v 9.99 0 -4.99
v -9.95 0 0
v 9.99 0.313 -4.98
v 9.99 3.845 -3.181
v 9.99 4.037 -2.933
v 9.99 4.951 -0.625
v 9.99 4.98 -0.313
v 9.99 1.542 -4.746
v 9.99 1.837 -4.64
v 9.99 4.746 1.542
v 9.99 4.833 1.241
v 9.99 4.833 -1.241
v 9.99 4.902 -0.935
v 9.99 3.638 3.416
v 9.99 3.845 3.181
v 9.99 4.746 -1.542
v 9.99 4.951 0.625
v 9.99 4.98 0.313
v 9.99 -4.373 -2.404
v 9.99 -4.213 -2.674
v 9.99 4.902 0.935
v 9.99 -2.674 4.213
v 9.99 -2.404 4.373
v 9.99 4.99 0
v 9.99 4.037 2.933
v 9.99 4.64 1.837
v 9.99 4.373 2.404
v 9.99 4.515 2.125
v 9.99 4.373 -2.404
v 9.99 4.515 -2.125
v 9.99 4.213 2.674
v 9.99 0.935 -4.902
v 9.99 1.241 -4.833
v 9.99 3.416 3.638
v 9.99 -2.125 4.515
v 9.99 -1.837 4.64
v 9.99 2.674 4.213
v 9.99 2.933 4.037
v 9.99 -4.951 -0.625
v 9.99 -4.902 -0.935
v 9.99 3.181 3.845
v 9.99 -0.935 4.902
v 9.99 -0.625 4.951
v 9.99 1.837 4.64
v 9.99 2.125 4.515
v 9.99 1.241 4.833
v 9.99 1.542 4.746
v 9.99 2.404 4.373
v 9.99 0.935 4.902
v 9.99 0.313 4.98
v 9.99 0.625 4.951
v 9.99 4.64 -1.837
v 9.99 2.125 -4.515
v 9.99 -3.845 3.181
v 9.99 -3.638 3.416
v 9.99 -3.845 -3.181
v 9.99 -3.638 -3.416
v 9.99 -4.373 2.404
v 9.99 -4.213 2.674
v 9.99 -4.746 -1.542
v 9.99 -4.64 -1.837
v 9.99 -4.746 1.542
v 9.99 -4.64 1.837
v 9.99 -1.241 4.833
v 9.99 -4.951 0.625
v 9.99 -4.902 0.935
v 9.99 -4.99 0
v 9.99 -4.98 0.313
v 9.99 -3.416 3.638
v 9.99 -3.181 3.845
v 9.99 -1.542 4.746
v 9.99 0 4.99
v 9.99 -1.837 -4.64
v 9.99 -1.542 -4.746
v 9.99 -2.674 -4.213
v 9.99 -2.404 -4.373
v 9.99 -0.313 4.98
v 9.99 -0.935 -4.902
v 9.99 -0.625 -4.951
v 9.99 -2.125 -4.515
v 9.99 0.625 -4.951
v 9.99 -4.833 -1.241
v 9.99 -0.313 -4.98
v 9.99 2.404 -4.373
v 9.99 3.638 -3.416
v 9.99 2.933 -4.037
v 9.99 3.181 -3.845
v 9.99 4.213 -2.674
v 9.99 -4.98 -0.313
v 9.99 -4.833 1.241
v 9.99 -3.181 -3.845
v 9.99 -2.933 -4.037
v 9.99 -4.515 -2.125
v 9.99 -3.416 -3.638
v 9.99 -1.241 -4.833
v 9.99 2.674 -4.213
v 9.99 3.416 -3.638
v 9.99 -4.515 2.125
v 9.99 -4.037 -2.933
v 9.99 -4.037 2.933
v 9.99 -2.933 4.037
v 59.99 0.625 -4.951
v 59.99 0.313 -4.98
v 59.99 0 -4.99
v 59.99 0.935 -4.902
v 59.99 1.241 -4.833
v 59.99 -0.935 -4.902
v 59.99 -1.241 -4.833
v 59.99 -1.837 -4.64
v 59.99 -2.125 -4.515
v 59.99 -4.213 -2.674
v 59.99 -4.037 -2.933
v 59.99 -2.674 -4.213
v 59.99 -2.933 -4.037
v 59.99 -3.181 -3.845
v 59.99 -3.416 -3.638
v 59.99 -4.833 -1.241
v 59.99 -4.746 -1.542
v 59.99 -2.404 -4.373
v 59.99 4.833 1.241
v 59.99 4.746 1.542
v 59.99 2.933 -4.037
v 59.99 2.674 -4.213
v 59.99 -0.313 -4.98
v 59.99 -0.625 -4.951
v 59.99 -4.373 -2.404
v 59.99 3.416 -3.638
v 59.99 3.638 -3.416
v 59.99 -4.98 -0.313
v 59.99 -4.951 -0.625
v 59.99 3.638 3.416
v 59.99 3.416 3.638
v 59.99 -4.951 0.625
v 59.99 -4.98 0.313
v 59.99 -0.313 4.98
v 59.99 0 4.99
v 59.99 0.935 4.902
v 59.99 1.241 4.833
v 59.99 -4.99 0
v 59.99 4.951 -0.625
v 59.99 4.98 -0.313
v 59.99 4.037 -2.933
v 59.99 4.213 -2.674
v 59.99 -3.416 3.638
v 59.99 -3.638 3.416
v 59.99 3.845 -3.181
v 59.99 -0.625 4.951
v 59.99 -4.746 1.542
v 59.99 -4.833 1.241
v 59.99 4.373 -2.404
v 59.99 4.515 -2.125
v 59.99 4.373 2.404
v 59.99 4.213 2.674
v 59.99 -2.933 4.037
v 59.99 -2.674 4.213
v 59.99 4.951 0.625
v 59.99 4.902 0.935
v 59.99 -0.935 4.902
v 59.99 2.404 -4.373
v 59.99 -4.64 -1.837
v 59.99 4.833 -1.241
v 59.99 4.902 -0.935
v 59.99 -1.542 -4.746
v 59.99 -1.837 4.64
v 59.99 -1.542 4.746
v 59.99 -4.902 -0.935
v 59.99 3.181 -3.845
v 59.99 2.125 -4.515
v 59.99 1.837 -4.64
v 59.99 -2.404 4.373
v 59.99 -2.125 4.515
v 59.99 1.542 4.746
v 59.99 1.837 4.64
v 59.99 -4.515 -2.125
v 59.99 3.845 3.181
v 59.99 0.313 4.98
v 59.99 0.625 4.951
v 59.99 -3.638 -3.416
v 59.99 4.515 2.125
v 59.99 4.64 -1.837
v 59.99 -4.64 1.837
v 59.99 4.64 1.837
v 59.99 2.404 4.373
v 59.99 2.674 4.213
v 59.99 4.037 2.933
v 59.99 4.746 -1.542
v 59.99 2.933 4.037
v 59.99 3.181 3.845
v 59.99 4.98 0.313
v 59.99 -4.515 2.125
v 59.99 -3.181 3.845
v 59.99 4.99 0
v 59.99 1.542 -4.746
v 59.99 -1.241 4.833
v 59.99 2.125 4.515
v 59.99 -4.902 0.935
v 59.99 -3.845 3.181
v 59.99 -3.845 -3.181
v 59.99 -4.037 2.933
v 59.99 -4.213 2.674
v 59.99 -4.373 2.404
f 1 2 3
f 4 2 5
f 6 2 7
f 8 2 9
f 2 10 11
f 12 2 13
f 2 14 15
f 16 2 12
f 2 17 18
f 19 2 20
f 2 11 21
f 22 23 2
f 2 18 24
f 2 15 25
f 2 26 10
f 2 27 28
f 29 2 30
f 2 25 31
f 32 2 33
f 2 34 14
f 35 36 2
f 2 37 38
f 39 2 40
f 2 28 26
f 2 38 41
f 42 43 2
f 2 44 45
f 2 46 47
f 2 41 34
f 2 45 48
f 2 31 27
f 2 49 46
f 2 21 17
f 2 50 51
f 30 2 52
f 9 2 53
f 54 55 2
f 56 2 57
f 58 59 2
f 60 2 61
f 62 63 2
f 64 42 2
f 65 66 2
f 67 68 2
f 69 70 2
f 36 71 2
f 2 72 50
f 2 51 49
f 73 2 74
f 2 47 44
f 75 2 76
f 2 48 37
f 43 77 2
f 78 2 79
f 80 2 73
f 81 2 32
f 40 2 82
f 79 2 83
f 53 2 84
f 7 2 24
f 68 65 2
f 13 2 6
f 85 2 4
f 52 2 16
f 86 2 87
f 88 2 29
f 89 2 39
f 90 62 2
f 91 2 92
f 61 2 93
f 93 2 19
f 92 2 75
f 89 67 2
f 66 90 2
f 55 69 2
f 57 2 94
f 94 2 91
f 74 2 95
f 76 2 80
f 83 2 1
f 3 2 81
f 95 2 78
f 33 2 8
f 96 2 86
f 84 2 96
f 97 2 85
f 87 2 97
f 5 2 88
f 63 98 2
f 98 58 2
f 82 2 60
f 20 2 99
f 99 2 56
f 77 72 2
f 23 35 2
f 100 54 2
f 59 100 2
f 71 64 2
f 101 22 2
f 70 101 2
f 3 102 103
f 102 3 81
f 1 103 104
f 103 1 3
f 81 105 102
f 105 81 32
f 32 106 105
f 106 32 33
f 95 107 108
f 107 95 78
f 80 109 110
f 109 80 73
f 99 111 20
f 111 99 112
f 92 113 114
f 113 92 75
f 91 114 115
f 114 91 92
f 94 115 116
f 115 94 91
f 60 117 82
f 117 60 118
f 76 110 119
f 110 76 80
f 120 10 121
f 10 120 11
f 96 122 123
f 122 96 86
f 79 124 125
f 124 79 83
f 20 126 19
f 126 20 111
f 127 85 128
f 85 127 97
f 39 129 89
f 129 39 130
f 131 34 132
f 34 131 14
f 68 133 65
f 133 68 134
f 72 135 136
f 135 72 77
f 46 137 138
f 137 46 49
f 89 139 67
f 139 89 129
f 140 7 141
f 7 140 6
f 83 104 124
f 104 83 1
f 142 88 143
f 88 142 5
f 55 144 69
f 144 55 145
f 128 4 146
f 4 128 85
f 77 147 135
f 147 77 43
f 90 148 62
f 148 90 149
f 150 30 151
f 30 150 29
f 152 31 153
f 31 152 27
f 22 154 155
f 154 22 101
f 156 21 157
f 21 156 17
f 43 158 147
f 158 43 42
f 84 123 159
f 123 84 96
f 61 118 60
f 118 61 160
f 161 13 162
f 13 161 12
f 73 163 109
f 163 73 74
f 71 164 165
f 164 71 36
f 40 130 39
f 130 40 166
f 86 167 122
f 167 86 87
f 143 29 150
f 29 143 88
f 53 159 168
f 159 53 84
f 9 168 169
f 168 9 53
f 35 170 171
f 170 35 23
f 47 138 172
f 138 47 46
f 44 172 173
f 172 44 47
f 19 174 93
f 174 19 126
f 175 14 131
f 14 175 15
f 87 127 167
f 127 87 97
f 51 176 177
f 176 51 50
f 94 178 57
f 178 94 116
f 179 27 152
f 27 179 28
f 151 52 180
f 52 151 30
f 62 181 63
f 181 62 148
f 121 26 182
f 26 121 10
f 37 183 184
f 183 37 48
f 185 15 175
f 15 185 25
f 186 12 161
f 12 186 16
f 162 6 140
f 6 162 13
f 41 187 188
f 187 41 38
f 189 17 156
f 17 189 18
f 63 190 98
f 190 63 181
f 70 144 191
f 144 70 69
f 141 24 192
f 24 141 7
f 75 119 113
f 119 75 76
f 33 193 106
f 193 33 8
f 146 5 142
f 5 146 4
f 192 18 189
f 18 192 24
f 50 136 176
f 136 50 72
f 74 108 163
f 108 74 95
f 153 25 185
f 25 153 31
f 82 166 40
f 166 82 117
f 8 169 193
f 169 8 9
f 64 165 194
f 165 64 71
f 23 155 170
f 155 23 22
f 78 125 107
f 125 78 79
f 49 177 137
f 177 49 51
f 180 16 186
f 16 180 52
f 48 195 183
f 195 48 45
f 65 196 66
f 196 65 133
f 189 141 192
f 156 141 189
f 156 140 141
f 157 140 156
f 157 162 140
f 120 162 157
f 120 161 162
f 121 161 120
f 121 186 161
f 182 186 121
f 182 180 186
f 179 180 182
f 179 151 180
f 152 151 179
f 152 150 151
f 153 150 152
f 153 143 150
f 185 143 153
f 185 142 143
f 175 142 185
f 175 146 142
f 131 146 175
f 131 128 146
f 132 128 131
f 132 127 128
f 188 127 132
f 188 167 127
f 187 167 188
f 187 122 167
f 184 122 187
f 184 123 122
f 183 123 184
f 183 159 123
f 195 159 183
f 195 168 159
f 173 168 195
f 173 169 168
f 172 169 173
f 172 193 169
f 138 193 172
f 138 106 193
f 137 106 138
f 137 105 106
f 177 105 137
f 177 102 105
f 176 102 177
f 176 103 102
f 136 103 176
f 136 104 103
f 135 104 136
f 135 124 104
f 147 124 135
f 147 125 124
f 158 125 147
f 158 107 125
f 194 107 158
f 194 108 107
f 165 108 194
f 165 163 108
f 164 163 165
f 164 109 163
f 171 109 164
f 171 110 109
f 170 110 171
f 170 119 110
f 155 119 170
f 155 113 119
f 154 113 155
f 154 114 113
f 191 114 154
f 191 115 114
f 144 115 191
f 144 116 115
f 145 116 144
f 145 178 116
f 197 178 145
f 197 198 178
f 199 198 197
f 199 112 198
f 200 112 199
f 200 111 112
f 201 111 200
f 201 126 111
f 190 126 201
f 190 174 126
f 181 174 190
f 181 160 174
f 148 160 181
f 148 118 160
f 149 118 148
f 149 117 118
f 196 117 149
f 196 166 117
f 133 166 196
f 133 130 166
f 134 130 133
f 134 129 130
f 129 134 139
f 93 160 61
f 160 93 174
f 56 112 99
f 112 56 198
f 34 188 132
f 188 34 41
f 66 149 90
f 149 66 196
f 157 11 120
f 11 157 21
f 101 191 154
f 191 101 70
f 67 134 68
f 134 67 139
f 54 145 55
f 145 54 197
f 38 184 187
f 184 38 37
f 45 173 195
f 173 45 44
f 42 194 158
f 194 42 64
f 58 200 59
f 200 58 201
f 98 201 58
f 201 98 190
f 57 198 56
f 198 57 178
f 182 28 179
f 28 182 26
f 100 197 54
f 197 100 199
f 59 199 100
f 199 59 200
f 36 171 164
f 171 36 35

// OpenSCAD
$fn=100;

module hopper(ht, funnel_h, funnel_r, orifice_r) {
    funnel_extension = orifice_r*funnel_h/(funnel_r - orifice_r);
    overlap = 1e-6*funnel_h;

    translate([-funnel_extension, 0, 0]) {
       rotate([0,90,0]) {
          union(){
             cylinder(h = funnel_h + funnel_extension, r1 = 0, r2 = funnel_r, center = false);
             translate([0,0,funnel_h + funnel_extension - overlap]){
                cylinder(h = ht, r = funnel_r, center = false);
             }
          }
       }
    }
}

module exa_hopper(vis_mode=true) {
    domain = [0.004, 0.001, 0.001];
    ht = 50;
    funnel_h = 9.99;
    funnel_r= 4.99;
    orifice_r= 2.49;
    
    hopper(ht = ht, funnel_h = funnel_h, funnel_r = funnel_r, orifice_r = orifice_r);
}

exa_hopper();
